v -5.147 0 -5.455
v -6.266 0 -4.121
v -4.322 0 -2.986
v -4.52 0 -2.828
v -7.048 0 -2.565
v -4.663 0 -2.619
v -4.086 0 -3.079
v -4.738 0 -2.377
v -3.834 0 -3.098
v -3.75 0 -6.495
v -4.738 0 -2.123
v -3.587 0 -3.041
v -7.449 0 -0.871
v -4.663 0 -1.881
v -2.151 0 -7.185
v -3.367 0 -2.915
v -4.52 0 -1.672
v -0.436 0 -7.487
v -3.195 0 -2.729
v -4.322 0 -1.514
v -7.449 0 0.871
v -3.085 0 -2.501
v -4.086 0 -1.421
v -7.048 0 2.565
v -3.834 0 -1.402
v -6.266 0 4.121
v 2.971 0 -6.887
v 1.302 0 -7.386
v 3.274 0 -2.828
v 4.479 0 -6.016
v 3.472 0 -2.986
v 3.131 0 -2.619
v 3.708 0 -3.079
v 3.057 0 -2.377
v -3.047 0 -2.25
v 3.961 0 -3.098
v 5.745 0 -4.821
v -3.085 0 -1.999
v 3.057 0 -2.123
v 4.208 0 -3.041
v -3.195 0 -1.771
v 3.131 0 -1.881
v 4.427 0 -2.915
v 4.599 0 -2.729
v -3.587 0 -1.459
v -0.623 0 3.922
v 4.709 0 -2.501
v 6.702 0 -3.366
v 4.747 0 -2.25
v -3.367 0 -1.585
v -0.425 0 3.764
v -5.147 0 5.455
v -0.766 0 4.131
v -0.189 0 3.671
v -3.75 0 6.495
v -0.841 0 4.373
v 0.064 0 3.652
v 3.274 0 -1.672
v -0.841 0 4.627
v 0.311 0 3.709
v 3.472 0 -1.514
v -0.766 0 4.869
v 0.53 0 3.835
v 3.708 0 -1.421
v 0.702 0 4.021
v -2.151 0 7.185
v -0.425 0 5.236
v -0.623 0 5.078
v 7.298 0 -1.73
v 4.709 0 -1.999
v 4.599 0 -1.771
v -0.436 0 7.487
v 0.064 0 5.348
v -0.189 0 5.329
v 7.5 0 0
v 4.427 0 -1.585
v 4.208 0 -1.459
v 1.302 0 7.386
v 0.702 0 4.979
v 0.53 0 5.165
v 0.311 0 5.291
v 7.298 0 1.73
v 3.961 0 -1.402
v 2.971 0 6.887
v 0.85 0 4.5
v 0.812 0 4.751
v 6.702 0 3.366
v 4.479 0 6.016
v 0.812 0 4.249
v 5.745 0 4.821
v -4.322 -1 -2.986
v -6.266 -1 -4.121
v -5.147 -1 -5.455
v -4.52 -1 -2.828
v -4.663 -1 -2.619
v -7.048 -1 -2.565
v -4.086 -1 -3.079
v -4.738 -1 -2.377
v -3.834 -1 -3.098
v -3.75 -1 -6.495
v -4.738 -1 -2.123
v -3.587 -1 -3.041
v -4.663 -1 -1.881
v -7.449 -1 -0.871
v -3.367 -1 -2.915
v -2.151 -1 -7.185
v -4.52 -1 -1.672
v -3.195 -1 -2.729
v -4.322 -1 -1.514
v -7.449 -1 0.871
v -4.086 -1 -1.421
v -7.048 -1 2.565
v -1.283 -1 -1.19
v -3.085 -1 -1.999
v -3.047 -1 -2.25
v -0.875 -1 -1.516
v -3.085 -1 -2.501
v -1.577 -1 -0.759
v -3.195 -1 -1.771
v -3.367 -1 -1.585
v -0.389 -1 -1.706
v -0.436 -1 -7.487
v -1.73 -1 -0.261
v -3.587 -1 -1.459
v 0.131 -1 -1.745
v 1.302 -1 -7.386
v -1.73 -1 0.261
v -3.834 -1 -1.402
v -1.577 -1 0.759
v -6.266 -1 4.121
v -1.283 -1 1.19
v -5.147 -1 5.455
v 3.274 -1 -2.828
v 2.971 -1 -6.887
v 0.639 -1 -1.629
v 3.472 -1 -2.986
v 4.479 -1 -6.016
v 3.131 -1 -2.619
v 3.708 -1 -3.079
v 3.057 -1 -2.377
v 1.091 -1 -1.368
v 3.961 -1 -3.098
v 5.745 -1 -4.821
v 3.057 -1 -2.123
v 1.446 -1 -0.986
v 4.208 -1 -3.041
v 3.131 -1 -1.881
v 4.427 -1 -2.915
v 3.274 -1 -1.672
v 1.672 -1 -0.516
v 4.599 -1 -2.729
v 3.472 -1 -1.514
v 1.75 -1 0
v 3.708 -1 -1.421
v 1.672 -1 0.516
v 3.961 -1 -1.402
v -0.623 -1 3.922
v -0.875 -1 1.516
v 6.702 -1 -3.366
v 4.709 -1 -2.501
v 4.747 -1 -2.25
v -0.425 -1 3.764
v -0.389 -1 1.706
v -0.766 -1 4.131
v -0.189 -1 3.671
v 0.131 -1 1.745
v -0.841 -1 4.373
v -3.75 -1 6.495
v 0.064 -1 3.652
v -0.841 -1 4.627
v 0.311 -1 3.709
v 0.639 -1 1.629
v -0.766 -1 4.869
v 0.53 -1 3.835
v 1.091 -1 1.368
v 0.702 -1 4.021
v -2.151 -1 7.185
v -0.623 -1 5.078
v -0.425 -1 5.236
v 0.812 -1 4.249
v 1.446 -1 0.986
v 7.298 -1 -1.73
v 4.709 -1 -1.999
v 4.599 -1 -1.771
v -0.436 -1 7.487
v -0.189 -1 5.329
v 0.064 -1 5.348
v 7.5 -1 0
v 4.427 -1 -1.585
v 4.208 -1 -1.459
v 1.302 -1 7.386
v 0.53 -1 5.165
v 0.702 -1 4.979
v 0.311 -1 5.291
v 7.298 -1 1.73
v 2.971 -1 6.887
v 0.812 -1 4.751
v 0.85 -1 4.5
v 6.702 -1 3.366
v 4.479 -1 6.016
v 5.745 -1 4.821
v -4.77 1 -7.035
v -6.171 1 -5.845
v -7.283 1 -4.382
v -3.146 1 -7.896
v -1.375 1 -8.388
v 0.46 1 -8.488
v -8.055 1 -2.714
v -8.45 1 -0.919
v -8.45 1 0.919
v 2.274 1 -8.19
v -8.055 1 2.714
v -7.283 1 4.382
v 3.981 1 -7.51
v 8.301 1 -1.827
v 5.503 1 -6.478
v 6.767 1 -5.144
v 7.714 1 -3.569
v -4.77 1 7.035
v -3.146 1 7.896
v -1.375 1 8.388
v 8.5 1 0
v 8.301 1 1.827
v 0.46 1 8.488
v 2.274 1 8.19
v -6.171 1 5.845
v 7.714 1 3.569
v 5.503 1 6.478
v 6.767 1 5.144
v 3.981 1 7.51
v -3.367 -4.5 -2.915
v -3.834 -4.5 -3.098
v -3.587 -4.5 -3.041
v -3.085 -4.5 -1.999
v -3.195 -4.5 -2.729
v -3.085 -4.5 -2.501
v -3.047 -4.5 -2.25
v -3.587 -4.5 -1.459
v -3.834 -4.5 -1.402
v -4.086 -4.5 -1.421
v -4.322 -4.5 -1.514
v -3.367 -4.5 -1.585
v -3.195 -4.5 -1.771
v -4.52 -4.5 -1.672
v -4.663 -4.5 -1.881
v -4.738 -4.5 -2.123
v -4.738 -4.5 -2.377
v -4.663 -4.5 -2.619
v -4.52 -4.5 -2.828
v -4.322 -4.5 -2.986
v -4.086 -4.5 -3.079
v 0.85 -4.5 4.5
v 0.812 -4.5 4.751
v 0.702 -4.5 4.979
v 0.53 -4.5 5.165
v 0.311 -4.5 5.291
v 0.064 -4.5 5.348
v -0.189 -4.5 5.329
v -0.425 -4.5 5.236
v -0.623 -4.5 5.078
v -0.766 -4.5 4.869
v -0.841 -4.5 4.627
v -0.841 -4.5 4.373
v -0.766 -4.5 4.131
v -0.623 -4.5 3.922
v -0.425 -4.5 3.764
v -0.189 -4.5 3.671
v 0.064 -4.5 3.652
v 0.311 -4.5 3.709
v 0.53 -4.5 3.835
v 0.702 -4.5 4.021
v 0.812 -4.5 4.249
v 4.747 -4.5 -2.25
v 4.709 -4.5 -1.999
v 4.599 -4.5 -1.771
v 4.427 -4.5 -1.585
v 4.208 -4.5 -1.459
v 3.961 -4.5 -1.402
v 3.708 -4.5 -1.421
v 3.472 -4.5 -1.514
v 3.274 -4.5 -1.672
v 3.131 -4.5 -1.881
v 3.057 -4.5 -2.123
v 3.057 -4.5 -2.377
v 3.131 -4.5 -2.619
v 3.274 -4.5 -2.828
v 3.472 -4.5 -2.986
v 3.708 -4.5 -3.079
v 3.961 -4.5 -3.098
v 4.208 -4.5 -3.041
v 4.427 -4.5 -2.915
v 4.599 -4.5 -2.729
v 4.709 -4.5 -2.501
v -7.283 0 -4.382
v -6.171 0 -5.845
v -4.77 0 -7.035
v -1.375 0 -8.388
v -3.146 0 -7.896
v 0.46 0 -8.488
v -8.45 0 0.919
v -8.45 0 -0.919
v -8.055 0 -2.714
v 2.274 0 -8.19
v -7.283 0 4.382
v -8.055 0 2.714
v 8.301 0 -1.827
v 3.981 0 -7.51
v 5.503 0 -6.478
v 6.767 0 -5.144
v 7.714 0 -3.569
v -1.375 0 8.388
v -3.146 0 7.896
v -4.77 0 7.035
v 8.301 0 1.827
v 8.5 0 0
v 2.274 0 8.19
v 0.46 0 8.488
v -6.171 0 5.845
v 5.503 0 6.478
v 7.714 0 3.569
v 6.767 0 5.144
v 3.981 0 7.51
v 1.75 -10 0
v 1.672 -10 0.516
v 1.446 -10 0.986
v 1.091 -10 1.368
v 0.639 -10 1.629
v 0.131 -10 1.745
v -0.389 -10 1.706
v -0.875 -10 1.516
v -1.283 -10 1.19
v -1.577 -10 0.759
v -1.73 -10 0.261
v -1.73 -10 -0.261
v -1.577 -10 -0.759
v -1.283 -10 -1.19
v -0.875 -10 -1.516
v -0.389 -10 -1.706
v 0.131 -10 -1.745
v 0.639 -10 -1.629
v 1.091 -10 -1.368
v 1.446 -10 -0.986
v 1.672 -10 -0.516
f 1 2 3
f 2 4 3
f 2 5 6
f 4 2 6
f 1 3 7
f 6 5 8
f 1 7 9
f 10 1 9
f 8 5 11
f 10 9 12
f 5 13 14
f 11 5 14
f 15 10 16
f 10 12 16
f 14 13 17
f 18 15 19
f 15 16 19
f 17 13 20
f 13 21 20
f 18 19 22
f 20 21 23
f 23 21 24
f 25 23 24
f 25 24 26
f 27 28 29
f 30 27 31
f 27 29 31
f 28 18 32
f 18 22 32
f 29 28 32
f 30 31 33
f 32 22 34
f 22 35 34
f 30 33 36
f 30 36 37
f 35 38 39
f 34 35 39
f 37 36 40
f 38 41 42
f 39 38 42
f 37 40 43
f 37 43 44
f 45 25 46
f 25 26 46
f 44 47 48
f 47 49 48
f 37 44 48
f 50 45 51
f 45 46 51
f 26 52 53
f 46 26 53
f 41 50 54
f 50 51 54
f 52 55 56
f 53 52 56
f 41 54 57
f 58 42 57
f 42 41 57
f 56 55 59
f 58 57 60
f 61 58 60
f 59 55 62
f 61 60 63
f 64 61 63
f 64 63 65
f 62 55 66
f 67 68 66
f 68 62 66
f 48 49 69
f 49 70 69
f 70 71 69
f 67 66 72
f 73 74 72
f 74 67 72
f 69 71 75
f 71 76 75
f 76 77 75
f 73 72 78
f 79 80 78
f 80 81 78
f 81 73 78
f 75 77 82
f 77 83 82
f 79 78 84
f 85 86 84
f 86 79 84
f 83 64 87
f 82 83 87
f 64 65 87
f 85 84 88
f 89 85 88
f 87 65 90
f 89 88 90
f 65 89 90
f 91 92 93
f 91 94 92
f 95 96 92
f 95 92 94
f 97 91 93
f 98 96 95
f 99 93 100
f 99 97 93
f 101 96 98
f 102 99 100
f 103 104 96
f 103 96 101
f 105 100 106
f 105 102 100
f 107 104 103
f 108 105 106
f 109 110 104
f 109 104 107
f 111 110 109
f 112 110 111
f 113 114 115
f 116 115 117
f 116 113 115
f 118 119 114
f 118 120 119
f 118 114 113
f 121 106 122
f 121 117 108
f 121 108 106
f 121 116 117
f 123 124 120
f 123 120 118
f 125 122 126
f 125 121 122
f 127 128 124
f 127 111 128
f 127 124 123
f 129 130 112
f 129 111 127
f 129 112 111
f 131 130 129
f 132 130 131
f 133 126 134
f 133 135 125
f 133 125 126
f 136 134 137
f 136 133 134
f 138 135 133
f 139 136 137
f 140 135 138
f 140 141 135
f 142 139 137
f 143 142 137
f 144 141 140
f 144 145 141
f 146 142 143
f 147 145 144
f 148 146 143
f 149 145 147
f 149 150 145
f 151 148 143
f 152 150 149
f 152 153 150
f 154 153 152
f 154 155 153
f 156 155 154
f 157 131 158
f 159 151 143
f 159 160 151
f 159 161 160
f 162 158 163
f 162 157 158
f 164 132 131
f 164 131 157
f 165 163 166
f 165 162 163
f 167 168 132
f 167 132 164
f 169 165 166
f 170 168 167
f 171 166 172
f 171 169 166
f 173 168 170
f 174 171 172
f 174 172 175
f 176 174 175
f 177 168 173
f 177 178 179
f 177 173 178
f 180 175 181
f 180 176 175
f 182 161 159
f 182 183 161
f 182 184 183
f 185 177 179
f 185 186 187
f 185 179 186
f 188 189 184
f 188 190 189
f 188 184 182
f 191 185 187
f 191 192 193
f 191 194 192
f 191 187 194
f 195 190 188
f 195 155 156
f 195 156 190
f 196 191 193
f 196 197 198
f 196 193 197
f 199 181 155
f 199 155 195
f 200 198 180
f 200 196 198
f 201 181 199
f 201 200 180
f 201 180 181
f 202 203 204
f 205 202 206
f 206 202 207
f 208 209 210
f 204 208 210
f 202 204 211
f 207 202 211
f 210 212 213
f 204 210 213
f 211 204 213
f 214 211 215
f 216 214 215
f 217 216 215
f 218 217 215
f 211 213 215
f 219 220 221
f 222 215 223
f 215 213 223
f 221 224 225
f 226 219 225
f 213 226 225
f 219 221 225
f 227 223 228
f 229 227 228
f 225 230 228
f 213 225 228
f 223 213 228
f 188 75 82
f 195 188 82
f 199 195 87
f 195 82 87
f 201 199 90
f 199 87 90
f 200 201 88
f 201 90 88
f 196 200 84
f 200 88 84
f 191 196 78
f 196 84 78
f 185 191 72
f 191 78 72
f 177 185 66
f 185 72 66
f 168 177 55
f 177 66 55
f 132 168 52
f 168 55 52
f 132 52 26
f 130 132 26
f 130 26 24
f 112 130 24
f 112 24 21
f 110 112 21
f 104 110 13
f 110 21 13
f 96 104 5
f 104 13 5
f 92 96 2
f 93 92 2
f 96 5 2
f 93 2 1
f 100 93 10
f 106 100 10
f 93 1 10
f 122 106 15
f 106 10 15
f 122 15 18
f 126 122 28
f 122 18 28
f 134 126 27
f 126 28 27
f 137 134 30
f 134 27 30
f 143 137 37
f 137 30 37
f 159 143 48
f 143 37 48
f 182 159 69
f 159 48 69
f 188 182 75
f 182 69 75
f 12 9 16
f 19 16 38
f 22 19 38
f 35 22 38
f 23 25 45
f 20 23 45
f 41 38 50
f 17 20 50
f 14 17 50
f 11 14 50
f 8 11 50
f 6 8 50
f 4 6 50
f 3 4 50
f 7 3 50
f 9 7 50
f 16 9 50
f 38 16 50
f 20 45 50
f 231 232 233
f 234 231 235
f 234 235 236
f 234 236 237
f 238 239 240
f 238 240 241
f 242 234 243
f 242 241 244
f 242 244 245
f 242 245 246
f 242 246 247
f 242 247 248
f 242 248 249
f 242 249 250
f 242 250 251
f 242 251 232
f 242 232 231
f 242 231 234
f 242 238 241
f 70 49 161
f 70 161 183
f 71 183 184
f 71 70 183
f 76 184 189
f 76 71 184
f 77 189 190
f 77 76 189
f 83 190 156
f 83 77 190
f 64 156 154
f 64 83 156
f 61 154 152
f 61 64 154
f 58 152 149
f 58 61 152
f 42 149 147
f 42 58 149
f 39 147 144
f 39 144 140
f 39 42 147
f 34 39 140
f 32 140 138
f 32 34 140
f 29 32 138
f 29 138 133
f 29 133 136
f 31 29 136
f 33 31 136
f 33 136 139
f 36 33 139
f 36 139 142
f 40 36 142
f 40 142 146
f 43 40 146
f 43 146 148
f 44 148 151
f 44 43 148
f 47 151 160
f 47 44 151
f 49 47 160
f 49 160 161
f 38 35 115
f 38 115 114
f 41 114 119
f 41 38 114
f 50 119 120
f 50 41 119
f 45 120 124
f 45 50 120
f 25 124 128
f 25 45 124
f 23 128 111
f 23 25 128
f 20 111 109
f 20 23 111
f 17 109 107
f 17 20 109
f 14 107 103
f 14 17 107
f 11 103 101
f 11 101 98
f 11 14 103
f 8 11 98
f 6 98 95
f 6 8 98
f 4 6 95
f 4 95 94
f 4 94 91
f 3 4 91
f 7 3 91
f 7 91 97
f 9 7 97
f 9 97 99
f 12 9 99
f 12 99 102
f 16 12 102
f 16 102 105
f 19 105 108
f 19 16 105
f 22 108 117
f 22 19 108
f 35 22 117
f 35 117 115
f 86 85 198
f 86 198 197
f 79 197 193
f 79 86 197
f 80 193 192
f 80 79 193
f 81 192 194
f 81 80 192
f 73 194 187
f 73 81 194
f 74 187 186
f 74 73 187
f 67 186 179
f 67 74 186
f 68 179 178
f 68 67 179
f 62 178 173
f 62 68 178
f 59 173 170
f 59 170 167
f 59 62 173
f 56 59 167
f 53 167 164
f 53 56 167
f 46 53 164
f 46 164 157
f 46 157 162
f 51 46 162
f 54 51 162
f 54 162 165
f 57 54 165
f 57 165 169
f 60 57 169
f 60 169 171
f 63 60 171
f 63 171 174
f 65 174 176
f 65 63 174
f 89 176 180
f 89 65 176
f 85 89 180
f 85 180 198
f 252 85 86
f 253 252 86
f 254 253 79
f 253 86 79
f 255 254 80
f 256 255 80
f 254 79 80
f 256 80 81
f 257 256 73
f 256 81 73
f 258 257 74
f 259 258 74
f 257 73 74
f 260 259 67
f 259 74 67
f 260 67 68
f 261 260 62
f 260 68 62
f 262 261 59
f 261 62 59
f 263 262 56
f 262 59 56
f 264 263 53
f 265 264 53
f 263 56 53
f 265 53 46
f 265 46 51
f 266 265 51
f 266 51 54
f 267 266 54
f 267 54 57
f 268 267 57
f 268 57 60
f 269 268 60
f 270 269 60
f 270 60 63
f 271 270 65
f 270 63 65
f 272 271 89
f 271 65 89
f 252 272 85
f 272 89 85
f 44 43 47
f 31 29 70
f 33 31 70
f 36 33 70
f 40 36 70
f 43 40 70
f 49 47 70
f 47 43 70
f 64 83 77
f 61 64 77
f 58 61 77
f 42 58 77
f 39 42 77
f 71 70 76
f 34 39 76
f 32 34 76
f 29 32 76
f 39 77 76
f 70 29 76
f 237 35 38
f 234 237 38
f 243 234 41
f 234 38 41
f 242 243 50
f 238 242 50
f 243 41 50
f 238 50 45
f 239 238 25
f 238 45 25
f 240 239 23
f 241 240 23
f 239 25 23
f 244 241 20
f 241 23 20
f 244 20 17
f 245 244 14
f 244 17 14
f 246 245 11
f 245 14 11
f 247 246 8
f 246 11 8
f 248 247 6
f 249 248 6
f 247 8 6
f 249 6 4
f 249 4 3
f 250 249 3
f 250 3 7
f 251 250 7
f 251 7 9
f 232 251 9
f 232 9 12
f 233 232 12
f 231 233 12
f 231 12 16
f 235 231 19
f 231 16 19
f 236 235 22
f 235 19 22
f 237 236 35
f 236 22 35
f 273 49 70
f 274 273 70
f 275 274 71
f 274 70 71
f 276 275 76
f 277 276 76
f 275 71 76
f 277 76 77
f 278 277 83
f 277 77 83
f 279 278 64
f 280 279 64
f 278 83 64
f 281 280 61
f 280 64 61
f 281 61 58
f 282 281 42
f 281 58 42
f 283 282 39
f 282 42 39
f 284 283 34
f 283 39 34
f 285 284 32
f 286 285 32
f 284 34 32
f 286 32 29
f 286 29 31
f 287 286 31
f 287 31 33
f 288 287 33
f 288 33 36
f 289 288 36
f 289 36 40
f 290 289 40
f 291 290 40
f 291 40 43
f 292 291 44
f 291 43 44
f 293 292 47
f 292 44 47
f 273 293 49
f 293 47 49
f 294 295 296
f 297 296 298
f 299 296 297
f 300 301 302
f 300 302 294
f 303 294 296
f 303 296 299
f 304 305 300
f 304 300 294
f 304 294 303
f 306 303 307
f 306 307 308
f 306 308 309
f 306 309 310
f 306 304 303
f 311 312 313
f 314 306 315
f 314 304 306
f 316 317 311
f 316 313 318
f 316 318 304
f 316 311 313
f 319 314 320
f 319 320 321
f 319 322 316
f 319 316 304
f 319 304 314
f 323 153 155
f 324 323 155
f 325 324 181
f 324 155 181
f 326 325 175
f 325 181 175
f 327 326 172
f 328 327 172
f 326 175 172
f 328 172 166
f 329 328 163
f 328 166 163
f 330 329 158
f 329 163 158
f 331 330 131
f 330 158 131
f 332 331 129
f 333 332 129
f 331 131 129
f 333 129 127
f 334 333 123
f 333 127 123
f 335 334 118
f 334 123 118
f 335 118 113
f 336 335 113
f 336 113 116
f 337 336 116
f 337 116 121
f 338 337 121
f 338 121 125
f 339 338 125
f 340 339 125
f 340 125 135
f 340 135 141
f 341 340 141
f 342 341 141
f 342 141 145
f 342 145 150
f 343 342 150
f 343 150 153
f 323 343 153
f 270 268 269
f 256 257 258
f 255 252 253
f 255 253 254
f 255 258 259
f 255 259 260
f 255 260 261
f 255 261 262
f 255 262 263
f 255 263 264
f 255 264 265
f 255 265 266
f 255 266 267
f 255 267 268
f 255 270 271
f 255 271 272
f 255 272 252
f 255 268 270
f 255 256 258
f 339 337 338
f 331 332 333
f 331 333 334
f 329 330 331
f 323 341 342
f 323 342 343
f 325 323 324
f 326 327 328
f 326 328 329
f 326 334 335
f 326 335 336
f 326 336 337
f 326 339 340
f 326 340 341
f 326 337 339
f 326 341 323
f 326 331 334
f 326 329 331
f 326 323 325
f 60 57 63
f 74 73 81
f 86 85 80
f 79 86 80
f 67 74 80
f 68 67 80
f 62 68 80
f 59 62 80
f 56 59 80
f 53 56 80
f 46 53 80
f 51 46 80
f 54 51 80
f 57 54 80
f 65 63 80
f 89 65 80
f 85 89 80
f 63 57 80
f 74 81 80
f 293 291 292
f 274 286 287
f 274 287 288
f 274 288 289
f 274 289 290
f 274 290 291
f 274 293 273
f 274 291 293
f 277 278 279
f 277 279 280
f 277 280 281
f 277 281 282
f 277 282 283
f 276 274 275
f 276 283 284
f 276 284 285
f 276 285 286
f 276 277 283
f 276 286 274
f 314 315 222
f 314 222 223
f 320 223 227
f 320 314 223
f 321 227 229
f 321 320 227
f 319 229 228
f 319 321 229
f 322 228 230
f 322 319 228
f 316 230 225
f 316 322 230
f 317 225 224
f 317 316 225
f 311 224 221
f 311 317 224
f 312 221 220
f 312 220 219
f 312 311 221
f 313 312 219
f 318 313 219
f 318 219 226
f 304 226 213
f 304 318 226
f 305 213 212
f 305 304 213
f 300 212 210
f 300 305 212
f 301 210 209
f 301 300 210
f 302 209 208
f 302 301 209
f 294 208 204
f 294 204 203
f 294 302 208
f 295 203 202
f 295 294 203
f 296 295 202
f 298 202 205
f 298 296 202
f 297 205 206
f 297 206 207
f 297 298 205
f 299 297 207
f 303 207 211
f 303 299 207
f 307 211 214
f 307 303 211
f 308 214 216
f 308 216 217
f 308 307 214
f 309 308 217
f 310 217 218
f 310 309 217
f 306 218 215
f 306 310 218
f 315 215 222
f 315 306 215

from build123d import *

# Parameters (mm, degrees)
F0_R     = 0.85
F1_DEPTH = 4.5
F0_R_2   = 7.5
F0_R_3   = 1.75
F2_DEPTH = 1
F0_R_4   = 8.5
F3_DEPTH = 1
F4_DEPTH = 10


with BuildPart() as f1:
    # F0 (on Front) → F1 (new body)
    with BuildSketch(Plane.XZ):
        with Locations((0, 4.5)):
            Circle(F0_R)
    extrude(amount=F1_DEPTH)


with BuildPart() as f1b:
    # F0 (on Front) → F1, piece 2 (new body)
    with BuildSketch(Plane.XZ):
        with Locations((-3.897114317, -2.25)):
            Circle(F0_R)
    extrude(amount=F1_DEPTH)


with BuildPart() as f1c:
    # F0 (on Front) → F1, piece 3 (new body)
    with BuildSketch(Plane.XZ):
        with Locations((3.897114317, -2.25)):
            Circle(F0_R)
    extrude(amount=F1_DEPTH)


with BuildPart() as f2:
    # F0 (on Front) → F2 (new body)
    with BuildSketch(Plane.XZ):
        Circle(F0_R_2)
        with Locations((-3.897114317, -2.25)):
            Circle(F0_R, mode=Mode.SUBTRACT)
        with Locations((3.897114317, -2.25)):
            Circle(F0_R, mode=Mode.SUBTRACT)
        Circle(F0_R_3, mode=Mode.SUBTRACT)
        with Locations((0, 4.5)):
            Circle(F0_R, mode=Mode.SUBTRACT)
    extrude(amount=F2_DEPTH)

    # F0 (on Front) → F4 (join)
    with BuildSketch(Plane.XZ):
        Circle(F0_R_3)
    extrude(amount=F4_DEPTH)


with BuildPart() as f3:
    # F0 (on Front) → F3 (new body)
    with BuildSketch(Plane.XZ):
        Circle(F0_R_4)
        Circle(F0_R_2, mode=Mode.SUBTRACT)
        Circle(F0_R_2)
        with Locations((-3.897114317, -2.25)):
            Circle(F0_R, mode=Mode.SUBTRACT)
        with Locations((3.897114317, -2.25)):
            Circle(F0_R, mode=Mode.SUBTRACT)
        Circle(F0_R_3, mode=Mode.SUBTRACT)
        with Locations((0, 4.5)):
            Circle(F0_R, mode=Mode.SUBTRACT)
        Circle(F0_R_3)
        with Locations((3.897114317, -2.25)):
            Circle(F0_R)
        with Locations((-3.897114317, -2.25)):
            Circle(F0_R)
        with Locations((0, 4.5)):
            Circle(F0_R)
    extrude(amount=-F3_DEPTH)


solid = Compound([f1.part, f1b.part, f1c.part, f2.part, f3.part])
